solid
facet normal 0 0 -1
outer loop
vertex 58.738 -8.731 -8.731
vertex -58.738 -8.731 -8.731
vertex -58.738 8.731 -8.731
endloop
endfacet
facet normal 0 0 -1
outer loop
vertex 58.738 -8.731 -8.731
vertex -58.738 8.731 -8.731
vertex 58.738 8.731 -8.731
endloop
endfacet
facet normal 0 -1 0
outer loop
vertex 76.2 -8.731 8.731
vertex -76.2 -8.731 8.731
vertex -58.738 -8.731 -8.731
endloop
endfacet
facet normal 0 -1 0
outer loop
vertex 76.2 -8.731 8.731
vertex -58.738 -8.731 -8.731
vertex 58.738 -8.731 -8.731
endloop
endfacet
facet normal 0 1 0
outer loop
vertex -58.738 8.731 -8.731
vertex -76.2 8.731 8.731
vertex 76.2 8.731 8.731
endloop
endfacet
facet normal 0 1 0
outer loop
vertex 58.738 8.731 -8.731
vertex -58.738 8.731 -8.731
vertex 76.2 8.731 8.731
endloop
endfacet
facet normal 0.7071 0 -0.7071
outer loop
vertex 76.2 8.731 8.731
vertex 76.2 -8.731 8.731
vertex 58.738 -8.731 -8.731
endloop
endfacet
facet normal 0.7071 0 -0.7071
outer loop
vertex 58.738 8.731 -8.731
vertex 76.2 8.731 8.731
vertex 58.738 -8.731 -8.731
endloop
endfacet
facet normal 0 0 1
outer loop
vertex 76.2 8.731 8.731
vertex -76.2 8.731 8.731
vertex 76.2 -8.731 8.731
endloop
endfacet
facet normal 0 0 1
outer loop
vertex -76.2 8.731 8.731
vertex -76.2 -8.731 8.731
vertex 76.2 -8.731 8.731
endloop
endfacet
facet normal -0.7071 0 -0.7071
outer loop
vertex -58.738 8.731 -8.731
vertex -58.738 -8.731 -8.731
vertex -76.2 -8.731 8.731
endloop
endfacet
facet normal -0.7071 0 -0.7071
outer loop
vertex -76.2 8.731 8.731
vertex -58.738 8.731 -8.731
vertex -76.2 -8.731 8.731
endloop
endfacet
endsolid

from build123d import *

# Parameters (mm, degrees)
F0_W     = 152.4
F0_H     = 17.4625
F1_DEPTH = 8.73125
F3_DEPTH = 17.4625
F4_DEPTH = 17.4625


# Not quite as in the source:
# - a length typed as a fraction of an inch, garbled in the dataset ("3 / 203.2 mm" for 3/8 in), is restored


with BuildPart() as f1:
    # F0 (on Front) → F1 (new body, symmetric)
    with BuildSketch(Plane.XZ):
        Rectangle(F0_W, F0_H)
    extrude(amount=F1_DEPTH, both=True)

    # F2 (on face) → F3 (cut)
    with BuildSketch(Plane.XZ.offset(8.73125)):
        Polygon((-58.7375, -8.73125), (-76.2, 8.73125), (-76.2, -8.73125), align=None)
    extrude(amount=-F3_DEPTH, mode=Mode.SUBTRACT)

    # F2 (on face) → F4 (cut)
    with BuildSketch(Plane.XZ.offset(8.73125)):
        Polygon((76.2, -8.73125), (76.2, 8.73125), (58.7375, -8.73125), align=None)
    extrude(amount=-F4_DEPTH, mode=Mode.SUBTRACT)


solid = f1.part
